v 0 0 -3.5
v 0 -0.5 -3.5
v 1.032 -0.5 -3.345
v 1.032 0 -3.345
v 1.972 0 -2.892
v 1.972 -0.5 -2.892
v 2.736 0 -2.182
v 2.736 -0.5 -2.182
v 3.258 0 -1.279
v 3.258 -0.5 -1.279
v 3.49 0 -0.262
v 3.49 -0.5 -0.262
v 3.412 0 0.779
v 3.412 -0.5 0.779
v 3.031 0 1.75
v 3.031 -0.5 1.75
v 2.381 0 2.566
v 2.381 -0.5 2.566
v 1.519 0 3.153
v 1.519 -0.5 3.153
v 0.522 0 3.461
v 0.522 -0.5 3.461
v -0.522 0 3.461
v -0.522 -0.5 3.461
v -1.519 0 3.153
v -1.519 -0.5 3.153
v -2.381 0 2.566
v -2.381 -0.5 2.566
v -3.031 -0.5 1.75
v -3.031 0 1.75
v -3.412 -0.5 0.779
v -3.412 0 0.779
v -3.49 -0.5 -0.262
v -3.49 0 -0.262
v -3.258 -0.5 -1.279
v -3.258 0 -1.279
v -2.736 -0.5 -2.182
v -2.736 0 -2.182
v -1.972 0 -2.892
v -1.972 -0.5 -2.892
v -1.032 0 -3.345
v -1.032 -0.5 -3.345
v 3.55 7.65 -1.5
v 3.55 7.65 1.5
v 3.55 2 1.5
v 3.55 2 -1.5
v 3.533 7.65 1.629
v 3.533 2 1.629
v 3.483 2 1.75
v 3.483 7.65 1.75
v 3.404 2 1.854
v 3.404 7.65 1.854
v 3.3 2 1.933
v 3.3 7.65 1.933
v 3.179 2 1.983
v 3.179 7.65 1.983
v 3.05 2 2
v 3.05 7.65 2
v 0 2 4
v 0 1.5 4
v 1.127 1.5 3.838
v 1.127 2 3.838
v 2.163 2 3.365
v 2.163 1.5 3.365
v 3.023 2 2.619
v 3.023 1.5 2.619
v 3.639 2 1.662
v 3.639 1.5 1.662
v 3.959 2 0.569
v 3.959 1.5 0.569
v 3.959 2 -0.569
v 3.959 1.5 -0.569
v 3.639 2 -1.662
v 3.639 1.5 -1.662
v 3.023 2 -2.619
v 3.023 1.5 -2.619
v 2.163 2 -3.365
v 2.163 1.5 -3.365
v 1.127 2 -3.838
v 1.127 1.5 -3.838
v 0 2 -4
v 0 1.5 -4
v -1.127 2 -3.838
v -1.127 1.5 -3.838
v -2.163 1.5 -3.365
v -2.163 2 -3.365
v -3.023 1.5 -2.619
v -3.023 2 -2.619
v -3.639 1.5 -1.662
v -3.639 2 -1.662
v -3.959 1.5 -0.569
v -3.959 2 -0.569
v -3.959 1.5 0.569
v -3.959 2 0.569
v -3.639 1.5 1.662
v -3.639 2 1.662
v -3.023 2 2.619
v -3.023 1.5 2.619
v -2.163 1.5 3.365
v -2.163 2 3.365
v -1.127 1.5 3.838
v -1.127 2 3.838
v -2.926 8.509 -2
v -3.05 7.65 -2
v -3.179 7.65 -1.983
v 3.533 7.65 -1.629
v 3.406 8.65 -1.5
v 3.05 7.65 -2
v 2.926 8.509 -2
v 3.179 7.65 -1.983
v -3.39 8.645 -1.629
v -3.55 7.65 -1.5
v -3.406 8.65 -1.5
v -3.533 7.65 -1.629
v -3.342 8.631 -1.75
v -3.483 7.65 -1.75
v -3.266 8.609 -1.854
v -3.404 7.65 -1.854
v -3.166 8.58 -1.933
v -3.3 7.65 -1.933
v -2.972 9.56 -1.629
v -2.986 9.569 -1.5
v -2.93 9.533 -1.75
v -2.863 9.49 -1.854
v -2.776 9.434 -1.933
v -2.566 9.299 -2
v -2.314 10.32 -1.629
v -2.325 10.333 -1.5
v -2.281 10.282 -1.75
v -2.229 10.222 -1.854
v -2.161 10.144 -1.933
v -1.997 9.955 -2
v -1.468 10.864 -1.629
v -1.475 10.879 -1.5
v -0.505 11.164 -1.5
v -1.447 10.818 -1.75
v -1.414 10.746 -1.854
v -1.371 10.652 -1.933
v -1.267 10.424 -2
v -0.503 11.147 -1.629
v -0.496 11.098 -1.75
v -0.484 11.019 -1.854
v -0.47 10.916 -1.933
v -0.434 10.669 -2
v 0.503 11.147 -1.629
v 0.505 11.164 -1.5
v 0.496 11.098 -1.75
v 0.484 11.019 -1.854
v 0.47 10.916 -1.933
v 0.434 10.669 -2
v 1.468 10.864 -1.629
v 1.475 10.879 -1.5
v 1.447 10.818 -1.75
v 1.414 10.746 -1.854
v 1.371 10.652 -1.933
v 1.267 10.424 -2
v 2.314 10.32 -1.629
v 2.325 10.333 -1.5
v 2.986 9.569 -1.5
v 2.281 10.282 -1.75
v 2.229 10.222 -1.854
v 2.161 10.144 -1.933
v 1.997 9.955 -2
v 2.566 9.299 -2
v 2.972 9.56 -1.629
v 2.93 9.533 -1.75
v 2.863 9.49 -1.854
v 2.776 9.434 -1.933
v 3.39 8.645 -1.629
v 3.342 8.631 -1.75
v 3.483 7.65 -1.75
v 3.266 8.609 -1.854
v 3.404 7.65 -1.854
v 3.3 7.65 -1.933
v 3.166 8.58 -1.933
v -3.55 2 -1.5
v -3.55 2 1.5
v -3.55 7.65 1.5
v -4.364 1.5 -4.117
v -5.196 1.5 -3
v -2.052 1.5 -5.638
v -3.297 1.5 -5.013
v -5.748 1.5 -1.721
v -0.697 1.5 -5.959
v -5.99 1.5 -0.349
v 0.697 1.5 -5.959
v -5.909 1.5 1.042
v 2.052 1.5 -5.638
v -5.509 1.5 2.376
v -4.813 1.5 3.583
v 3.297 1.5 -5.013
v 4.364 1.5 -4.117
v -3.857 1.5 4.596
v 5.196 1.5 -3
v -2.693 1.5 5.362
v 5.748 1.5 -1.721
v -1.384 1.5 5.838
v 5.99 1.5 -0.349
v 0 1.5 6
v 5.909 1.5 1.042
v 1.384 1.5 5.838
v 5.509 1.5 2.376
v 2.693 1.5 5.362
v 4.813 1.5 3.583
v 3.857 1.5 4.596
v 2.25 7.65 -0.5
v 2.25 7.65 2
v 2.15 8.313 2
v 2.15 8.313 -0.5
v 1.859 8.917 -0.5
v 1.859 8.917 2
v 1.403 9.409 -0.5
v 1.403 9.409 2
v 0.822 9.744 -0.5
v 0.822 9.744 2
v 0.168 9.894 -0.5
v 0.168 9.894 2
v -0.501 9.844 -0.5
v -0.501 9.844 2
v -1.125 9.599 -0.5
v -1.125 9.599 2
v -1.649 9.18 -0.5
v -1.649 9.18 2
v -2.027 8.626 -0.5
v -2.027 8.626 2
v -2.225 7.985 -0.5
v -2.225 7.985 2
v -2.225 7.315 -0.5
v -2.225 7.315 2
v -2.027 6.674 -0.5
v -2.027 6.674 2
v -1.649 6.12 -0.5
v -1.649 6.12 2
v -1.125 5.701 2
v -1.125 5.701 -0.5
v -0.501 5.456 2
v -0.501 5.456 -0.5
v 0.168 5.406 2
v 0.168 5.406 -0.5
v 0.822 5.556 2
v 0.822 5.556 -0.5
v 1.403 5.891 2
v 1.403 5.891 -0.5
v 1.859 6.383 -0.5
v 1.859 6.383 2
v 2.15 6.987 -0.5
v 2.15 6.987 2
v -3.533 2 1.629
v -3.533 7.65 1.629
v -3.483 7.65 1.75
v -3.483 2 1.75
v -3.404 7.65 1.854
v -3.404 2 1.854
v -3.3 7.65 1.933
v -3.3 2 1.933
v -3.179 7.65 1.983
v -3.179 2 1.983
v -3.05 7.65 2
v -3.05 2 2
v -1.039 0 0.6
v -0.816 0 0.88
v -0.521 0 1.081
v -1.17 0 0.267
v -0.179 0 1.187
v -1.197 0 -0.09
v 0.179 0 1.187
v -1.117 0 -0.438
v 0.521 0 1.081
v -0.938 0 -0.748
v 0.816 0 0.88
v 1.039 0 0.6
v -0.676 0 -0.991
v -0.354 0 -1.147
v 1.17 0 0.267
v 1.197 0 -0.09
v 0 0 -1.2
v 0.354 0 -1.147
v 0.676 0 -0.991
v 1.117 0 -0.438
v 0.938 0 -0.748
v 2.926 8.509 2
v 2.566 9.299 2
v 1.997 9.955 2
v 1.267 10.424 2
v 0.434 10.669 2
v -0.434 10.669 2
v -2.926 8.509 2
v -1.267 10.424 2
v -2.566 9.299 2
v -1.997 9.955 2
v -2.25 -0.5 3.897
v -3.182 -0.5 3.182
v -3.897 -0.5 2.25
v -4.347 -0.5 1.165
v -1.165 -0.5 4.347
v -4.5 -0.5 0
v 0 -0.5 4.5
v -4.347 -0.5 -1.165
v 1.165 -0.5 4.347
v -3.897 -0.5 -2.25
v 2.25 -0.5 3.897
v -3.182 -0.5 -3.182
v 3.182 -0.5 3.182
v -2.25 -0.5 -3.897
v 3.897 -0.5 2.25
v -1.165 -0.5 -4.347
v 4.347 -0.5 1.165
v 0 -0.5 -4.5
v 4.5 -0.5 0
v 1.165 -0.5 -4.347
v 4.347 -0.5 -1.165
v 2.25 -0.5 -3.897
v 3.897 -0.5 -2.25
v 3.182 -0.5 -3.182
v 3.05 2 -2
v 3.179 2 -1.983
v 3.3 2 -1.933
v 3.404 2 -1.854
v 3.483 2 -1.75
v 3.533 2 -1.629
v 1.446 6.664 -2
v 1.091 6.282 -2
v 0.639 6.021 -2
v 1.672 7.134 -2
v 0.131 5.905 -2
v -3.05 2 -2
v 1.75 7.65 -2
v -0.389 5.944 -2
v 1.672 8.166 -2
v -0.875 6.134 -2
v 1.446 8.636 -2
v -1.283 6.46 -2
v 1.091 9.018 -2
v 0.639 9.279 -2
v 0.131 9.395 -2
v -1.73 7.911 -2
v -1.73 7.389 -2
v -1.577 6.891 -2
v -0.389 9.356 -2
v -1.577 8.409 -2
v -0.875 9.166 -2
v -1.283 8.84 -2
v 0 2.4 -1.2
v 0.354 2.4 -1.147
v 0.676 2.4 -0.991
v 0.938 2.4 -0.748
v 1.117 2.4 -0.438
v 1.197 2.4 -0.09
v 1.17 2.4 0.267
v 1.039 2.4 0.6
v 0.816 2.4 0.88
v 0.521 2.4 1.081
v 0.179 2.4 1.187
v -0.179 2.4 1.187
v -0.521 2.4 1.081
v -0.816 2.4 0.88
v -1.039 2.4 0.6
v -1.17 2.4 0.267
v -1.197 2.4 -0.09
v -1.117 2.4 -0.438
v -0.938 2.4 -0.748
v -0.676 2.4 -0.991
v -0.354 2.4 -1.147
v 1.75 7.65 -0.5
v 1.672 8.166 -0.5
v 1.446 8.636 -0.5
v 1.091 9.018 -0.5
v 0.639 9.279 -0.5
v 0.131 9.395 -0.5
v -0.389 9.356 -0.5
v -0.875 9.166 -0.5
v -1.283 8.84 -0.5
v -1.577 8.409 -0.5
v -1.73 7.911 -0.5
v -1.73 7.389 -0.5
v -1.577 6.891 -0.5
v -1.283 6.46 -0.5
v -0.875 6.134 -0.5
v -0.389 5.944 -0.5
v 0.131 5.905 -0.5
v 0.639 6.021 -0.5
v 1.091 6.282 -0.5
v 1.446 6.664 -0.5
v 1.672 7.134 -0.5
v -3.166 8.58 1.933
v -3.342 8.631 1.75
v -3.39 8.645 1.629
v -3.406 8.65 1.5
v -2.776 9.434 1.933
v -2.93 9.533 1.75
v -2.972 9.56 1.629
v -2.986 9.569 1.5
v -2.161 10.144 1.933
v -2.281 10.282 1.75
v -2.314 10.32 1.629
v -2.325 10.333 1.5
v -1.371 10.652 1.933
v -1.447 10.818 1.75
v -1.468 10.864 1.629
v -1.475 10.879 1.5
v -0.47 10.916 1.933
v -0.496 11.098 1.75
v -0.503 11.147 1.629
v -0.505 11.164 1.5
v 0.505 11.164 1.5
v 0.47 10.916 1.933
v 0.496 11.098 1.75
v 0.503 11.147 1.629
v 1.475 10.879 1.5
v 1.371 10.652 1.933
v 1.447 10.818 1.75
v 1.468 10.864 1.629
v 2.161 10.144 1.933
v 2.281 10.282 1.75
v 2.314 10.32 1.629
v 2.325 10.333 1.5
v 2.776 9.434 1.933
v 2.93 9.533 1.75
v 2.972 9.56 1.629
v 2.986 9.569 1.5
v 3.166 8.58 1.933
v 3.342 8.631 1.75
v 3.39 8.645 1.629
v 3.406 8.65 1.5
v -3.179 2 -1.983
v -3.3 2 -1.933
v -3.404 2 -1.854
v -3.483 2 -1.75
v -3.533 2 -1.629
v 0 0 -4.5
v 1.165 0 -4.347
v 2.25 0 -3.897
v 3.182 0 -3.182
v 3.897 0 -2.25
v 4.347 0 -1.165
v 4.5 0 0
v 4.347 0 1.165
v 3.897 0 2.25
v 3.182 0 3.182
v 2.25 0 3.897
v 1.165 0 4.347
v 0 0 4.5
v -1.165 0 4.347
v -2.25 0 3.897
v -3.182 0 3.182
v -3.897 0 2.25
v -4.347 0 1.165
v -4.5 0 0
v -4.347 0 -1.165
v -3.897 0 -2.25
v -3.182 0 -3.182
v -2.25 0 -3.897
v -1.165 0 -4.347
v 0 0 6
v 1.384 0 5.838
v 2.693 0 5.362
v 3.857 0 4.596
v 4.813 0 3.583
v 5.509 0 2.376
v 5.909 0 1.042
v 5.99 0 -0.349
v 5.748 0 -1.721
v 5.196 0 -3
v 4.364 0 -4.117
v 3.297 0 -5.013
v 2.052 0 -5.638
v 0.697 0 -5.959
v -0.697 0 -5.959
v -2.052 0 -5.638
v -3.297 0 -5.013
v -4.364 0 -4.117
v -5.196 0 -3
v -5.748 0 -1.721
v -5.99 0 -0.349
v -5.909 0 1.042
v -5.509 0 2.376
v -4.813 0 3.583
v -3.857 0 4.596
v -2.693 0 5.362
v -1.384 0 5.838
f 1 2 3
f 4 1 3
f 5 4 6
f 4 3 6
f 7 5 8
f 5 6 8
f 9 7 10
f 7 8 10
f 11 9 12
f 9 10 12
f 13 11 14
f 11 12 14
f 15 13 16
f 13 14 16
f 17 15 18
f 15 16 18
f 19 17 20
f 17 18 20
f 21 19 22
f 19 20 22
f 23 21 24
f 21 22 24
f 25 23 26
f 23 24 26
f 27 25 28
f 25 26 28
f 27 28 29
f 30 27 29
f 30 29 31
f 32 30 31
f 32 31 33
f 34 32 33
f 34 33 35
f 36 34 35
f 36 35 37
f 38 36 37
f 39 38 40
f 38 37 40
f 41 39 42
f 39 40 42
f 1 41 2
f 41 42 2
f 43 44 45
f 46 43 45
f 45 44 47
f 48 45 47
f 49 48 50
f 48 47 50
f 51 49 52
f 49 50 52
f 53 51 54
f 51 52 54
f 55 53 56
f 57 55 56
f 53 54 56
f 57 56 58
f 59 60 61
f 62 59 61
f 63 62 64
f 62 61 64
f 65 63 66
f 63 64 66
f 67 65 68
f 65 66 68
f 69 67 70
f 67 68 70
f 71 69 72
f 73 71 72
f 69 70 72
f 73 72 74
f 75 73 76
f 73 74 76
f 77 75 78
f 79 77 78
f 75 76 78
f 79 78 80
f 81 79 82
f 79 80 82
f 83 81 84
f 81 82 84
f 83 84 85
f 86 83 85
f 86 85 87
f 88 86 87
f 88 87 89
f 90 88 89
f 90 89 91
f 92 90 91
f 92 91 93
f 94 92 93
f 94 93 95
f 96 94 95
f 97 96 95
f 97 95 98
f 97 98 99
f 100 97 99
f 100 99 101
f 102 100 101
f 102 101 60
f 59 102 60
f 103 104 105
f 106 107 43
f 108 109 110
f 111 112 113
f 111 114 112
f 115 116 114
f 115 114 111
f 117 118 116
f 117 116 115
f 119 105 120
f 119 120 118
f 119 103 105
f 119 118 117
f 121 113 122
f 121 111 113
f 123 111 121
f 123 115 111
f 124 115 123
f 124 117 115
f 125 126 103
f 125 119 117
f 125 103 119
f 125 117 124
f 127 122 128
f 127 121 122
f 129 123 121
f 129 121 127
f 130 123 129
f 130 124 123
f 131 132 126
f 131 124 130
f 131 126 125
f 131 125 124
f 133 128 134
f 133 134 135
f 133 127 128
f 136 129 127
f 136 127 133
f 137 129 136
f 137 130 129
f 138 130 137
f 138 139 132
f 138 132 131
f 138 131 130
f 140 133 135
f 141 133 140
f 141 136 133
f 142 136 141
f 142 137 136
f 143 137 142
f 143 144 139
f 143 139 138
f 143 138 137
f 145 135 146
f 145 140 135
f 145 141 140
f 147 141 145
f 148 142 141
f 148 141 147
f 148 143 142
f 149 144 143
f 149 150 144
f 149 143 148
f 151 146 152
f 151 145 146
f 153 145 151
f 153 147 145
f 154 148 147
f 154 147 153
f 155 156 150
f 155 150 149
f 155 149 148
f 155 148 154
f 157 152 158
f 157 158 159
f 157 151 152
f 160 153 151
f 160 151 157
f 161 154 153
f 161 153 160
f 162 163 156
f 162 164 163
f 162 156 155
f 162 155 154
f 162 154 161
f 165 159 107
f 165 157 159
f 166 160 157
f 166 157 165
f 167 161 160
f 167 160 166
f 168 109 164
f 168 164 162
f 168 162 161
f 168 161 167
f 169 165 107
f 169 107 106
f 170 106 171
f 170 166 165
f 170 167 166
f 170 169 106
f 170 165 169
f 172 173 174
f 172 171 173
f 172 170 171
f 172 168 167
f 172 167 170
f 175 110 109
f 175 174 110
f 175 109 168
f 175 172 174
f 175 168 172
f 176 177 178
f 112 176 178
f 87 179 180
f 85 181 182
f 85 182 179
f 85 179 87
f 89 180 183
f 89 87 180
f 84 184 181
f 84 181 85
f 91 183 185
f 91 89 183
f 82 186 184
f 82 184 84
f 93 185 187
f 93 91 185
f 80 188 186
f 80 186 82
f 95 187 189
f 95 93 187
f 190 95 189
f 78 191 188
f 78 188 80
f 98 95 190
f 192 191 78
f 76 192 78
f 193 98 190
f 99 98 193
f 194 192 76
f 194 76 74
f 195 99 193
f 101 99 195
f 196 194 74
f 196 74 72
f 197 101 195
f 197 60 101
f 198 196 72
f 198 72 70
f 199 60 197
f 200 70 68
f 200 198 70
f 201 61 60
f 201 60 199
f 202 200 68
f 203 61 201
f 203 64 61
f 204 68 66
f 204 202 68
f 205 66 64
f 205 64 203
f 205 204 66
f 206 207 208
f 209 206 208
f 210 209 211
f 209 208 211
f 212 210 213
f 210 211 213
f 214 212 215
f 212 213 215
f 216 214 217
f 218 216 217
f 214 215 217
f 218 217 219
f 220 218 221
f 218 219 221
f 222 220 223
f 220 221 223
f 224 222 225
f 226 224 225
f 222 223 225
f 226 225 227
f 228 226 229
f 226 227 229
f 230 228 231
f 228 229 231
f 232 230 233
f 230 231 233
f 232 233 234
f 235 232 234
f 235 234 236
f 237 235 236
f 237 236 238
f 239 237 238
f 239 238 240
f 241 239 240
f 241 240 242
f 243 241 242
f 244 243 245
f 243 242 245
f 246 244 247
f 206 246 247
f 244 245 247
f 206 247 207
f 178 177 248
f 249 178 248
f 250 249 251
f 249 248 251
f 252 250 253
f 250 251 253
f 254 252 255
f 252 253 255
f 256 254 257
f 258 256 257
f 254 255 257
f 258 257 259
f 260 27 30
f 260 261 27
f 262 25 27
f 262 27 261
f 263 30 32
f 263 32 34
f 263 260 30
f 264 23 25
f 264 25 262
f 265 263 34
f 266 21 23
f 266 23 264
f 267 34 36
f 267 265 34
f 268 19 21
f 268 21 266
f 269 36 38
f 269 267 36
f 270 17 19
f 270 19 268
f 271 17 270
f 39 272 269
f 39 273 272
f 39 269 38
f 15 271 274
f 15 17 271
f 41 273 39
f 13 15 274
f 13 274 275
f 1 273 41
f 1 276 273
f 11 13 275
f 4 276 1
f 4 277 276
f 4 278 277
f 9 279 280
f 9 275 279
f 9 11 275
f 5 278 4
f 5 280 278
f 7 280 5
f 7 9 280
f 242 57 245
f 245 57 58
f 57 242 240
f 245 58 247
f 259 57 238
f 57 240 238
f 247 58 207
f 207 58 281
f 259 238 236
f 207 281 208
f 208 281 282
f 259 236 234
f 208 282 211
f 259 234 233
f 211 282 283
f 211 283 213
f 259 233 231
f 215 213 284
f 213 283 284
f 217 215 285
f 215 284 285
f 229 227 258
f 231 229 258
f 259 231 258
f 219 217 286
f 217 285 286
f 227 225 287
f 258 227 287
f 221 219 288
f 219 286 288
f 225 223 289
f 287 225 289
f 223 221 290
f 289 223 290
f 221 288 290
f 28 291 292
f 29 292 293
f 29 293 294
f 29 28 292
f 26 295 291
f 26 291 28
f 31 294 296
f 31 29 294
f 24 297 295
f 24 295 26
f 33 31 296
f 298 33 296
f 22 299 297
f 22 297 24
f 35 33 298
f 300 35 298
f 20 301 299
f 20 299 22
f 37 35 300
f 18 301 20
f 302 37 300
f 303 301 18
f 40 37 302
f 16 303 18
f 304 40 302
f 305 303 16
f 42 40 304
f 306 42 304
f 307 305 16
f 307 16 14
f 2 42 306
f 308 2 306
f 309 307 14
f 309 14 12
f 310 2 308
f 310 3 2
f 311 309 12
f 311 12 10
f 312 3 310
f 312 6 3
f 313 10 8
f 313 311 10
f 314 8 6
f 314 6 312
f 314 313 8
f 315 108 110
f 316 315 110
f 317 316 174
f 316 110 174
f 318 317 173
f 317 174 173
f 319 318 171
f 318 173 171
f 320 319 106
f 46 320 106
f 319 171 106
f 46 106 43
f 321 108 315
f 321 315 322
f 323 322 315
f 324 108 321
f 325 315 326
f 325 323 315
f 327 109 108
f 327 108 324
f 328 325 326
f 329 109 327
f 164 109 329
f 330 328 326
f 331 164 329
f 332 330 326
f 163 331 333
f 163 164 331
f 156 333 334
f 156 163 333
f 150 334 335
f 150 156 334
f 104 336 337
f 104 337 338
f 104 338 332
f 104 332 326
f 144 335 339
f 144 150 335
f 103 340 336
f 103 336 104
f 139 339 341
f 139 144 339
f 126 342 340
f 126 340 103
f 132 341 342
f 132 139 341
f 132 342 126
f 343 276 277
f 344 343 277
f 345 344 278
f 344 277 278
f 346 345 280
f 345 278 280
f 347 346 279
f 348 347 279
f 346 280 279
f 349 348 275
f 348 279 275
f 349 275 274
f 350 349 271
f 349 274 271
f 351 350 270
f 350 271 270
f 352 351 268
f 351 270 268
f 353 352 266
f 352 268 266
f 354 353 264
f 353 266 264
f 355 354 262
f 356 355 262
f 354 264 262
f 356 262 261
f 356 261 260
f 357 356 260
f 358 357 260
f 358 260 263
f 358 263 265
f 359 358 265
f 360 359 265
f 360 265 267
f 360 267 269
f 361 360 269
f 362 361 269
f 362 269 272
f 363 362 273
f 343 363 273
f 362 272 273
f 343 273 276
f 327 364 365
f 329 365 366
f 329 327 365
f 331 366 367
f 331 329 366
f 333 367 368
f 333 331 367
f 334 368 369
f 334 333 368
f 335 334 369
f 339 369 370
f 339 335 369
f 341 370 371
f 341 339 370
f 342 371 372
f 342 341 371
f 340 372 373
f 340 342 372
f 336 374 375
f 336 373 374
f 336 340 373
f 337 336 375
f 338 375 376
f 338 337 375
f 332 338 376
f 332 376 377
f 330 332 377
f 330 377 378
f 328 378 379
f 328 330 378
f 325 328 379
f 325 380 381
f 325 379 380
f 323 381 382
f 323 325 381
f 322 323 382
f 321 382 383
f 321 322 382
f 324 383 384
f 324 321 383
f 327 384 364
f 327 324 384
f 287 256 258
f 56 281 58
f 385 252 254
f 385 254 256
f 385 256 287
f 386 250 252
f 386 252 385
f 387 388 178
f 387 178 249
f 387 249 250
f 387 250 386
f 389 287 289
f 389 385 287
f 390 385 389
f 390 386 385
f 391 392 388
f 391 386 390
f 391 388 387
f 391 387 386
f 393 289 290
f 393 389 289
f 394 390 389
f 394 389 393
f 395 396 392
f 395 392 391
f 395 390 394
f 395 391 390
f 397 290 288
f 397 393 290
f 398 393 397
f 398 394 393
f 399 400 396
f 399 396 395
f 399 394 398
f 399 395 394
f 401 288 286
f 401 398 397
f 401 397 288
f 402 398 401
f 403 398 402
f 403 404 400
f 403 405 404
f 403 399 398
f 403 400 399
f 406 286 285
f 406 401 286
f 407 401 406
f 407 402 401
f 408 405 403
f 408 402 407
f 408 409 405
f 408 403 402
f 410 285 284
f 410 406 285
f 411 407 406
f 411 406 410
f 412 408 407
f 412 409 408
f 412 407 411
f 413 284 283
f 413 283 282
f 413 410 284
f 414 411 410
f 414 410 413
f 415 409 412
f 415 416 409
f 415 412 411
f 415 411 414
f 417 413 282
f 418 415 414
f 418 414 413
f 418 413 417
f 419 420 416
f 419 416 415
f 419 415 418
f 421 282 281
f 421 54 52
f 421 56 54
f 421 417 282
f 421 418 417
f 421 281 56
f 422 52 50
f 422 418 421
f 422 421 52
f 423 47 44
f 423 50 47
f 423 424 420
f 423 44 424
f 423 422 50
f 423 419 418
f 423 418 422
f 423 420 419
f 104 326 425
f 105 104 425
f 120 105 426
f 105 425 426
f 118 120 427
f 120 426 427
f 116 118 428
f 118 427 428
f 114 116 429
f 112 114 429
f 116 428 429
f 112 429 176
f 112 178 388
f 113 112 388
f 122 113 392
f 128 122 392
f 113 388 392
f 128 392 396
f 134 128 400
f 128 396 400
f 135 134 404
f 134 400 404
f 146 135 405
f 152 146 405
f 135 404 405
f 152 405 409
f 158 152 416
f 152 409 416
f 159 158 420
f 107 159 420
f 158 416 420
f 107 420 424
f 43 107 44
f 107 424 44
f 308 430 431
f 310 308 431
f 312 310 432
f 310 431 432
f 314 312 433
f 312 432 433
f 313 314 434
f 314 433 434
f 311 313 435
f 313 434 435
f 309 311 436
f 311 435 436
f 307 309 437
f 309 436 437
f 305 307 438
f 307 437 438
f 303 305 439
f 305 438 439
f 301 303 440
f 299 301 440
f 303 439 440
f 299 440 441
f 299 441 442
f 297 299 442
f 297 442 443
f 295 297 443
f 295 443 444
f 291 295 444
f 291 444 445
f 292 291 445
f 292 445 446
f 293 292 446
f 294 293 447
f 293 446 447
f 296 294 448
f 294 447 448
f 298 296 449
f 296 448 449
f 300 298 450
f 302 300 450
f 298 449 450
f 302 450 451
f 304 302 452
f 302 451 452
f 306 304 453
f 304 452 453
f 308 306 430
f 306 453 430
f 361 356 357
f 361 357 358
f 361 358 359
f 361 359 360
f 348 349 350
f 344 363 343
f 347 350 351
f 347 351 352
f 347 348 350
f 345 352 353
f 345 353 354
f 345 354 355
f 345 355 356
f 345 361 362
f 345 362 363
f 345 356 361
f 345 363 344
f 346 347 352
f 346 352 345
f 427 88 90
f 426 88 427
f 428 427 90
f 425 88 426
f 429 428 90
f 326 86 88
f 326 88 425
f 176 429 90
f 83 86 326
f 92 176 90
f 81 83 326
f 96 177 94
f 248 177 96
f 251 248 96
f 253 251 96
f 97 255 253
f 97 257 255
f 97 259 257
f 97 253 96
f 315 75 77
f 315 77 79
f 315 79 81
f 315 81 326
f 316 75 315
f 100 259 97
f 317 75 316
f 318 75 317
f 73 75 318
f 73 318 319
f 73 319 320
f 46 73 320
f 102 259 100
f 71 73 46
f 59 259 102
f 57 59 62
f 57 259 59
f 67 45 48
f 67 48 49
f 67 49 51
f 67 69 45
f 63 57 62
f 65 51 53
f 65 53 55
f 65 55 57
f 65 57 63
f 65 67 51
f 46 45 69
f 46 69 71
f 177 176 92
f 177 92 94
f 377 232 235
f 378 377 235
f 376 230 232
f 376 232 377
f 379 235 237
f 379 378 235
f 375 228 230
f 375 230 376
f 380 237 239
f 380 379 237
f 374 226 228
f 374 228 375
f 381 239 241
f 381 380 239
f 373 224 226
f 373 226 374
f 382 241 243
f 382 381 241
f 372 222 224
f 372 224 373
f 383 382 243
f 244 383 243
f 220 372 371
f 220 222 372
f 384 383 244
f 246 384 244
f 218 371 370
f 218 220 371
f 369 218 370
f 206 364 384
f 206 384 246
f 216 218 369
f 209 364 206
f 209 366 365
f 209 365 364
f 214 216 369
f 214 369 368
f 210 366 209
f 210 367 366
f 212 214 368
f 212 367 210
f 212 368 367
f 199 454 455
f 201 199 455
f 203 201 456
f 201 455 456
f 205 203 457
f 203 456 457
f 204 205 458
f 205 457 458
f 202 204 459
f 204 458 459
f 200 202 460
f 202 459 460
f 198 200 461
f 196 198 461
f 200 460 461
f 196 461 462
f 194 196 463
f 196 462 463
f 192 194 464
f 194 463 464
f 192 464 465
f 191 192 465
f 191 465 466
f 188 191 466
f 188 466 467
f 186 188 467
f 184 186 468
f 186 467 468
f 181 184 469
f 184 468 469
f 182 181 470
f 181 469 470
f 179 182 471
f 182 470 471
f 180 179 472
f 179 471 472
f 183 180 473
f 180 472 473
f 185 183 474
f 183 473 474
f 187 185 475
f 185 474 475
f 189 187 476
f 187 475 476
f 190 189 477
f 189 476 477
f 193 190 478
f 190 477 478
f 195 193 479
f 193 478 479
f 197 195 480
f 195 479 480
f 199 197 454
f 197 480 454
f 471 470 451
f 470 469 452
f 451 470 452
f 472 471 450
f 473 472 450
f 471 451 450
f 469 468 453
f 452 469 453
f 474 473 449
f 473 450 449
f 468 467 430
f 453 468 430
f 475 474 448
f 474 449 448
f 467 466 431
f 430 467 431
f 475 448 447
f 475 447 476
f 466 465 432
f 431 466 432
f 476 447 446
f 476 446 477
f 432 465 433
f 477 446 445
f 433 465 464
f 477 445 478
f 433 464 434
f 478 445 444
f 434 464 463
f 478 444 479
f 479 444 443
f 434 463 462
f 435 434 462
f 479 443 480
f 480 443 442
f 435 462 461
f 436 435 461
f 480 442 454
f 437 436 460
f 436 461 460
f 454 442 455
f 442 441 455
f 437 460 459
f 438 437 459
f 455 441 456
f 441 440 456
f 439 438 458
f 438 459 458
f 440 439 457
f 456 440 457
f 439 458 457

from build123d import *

# Parameters (mm, degrees)
SKETCH_1_R          = 6
EXTRUDE_1_DEPTH     = 1.5
SKETCH_2_R          = 4
EXTRUDE_2_DEPTH     = 0.5
SKETCH_3_R          = 4.5
EXTRUDE_3_DEPTH     = 0.5
SKETCH_4_R          = 3.5
CUT_EXTRUDE_1_DEPTH = 0.5
SKETCH_8_R          = 1.75
EXTRUDE_5_DEPTH     = 2
SKETCH_9_R          = 2.25
CUT_EXTRUDE_3_DEPTH = 2.5
FILLET_1_R          = 0.5
SKETCH_5_R          = 1.2
CUT_EXTRUDE_2_DEPTH = 2.4


with BuildPart() as part:
    # ｽｹｯﾁ1 → ﾎﾞｽ - 押し出し1 (new body)
    with BuildSketch(Plane(origin=(0, 0, 0), x_dir=(1, 0, 0), z_dir=(0, 1, 0))):
        with Locations(Location((0, 0, 0), (0, 0, 270))):
            Circle(SKETCH_1_R)
    extrude(amount=EXTRUDE_1_DEPTH)

    # ｽｹｯﾁ2 → ﾎﾞｽ - 押し出し2 (add)
    with BuildSketch(Plane(origin=(0, 1.5, 0), x_dir=(1, 0, 0), z_dir=(0, 1, 0))):
        with Locations(Location((0, 0, 0), (0, 0, 270))):
            Circle(SKETCH_2_R)
    extrude(amount=EXTRUDE_2_DEPTH)

    # ｽｹｯﾁ3 → ﾎﾞｽ - 押し出し3 (add)
    with BuildSketch(Plane.XZ):
        with Locations(Location((0, 0, 0), (0, 0, 270))):
            Circle(SKETCH_3_R)
    extrude(amount=EXTRUDE_3_DEPTH)

    # ｽｹｯﾁ4 → ｶｯﾄ - 押し出し1 (cut)
    with BuildSketch(Plane.XZ.offset(0.5)):
        with Locations(Location((0, 0, 0), (0, 0, 270))):
            Circle(SKETCH_4_R)
    extrude(amount=-CUT_EXTRUDE_1_DEPTH, mode=Mode.SUBTRACT)

    # ｽｹｯﾁ8 → ﾎﾞｽ - 押し出し5 (add, symmetric)
    with BuildSketch(Plane.XY):
        with BuildLine():
            Line((-3.55, 2), (-3.55, 7.65))
            ThreePointArc((-3.55, 7.65), (0, 11.2), (3.55, 7.65))
            Line((3.55, 7.65), (3.55, 2))
            Line((3.55, 2), (-3.55, 2))
        make_face()
        with Locations((0, 7.65)):
            Circle(SKETCH_8_R, mode=Mode.SUBTRACT)
    extrude(amount=EXTRUDE_5_DEPTH, both=True)

    # ｽｹｯﾁ9 → ｶｯﾄ - 押し出し3 (cut)
    with BuildSketch(Plane.XY.offset(2)):
        with Locations((0, 7.65)):
            Circle(SKETCH_9_R)
    extrude(amount=-CUT_EXTRUDE_3_DEPTH, mode=Mode.SUBTRACT)

    # ﾌｨﾚｯﾄ1
    # the kernel refuses this fillet: 0.5 mm, written as the material it takes off along each edge
    with BuildSketch(Plane(origin=(3.55, 7.65, 2), x_dir=(-1, 0, 0), z_dir=(0, -1, 0)), Plane(origin=(-3.55, 2, 2), x_dir=(1, 0, 0), z_dir=(0, 1, 0)), Plane(origin=(-3.55, 2, -2), x_dir=(0, 0, 1), z_dir=(0, 1, 0))) as fillet_1_piece_1:
        with BuildLine():
            CenterArc((FILLET_1_R, FILLET_1_R), FILLET_1_R, 180, 90)
            Line((0, FILLET_1_R), (0, 0))
            Line((0, 0), (FILLET_1_R, 0))
        make_face()
    extrude(amount=5.65, mode=Mode.SUBTRACT)
    with BuildSketch(Plane(origin=(0, 7.65, 2), x_dir=(-1, 0, 0), z_dir=(0, -1, 0))) as fillet_1_piece_2:
        with BuildLine():
            CenterArc((3.55 - FILLET_1_R, FILLET_1_R), FILLET_1_R, 270, 90)
            Line((3.55, FILLET_1_R), (3.55, 0))
            Line((3.55, 0), (3.55 - FILLET_1_R, 0))
        make_face()
    revolve(axis=Axis((0, 7.65, 2), (0, 0, -1)), revolution_arc=180, mode=Mode.SUBTRACT)
    with BuildSketch(Plane(origin=(3.55, 7.65, -2), x_dir=(-1, 0, 0), z_dir=(0, -1, 0))) as fillet_1_piece_3:
        with BuildLine():
            CenterArc((FILLET_1_R, -FILLET_1_R), FILLET_1_R, 90, 90)
            Line((0, -FILLET_1_R), (0, 0))
            Line((0, 0), (FILLET_1_R, 0))
        make_face()
    extrude(amount=5.65, mode=Mode.SUBTRACT)
    with BuildSketch(Plane(origin=(0, 7.65, -2), x_dir=(-1, 0, 0), z_dir=(0, -1, 0))) as fillet_1_piece_4:
        with BuildLine():
            CenterArc((3.55 - FILLET_1_R, -FILLET_1_R), FILLET_1_R, 0, 90)
            Line((3.55, -FILLET_1_R), (3.55, 0))
            Line((3.55, 0), (3.55 - FILLET_1_R, 0))
        make_face()
    revolve(axis=Axis((0, 7.65, -2), (0, 0, -1)), revolution_arc=180, mode=Mode.SUBTRACT)

    # ｽｹｯﾁ5 → ｶｯﾄ - 押し出し2 (cut)
    with BuildSketch(Plane.XZ):
        with Locations(Location((0, 0, 0), (0, 0, 270))):
            Circle(SKETCH_5_R)
    extrude(amount=-CUT_EXTRUDE_2_DEPTH, mode=Mode.SUBTRACT)


solid = part.part
